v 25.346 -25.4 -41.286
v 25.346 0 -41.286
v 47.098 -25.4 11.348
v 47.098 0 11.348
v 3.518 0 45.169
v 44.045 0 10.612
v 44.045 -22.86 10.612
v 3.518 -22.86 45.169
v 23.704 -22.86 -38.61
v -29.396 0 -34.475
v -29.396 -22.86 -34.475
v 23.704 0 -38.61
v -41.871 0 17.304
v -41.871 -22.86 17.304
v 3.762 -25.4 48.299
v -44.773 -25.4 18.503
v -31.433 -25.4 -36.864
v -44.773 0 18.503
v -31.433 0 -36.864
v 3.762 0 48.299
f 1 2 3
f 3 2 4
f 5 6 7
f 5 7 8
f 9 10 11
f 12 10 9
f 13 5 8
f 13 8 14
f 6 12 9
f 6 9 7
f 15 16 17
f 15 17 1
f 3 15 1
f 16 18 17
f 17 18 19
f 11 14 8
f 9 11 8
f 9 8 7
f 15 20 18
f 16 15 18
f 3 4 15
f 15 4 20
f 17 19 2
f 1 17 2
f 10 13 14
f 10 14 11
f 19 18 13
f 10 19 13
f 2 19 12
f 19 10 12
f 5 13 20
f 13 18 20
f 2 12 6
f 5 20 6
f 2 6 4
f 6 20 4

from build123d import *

# Parameters (mm, degrees)
F3_DEPTH = 25.4
F4_T     = -2.54


# Not quite as in the source:
# - the program builds the solid bodies; features that only make, move or delete a surface that nothing else refers to are left out


with BuildPart() as f3:
    # F2 (on Front) → F3 (new body)
    with BuildSketch(Plane.XZ):
        Polygon((3.7617208479, 48.2991386944), (-44.7727749167, 18.5028637951), (-31.4328175171, -36.8637399798), (25.346225329, -41.2859080551), (47.0976462569, 11.3476455454), align=None)
    extrude(amount=F3_DEPTH)

    # F4
    f4_openings = [f3.faces().sort_by_distance(p)[0] for p in [
        (0, 0, 0),
    ]]
    offset(amount=F4_T, openings=f4_openings)


solid = f3.part
